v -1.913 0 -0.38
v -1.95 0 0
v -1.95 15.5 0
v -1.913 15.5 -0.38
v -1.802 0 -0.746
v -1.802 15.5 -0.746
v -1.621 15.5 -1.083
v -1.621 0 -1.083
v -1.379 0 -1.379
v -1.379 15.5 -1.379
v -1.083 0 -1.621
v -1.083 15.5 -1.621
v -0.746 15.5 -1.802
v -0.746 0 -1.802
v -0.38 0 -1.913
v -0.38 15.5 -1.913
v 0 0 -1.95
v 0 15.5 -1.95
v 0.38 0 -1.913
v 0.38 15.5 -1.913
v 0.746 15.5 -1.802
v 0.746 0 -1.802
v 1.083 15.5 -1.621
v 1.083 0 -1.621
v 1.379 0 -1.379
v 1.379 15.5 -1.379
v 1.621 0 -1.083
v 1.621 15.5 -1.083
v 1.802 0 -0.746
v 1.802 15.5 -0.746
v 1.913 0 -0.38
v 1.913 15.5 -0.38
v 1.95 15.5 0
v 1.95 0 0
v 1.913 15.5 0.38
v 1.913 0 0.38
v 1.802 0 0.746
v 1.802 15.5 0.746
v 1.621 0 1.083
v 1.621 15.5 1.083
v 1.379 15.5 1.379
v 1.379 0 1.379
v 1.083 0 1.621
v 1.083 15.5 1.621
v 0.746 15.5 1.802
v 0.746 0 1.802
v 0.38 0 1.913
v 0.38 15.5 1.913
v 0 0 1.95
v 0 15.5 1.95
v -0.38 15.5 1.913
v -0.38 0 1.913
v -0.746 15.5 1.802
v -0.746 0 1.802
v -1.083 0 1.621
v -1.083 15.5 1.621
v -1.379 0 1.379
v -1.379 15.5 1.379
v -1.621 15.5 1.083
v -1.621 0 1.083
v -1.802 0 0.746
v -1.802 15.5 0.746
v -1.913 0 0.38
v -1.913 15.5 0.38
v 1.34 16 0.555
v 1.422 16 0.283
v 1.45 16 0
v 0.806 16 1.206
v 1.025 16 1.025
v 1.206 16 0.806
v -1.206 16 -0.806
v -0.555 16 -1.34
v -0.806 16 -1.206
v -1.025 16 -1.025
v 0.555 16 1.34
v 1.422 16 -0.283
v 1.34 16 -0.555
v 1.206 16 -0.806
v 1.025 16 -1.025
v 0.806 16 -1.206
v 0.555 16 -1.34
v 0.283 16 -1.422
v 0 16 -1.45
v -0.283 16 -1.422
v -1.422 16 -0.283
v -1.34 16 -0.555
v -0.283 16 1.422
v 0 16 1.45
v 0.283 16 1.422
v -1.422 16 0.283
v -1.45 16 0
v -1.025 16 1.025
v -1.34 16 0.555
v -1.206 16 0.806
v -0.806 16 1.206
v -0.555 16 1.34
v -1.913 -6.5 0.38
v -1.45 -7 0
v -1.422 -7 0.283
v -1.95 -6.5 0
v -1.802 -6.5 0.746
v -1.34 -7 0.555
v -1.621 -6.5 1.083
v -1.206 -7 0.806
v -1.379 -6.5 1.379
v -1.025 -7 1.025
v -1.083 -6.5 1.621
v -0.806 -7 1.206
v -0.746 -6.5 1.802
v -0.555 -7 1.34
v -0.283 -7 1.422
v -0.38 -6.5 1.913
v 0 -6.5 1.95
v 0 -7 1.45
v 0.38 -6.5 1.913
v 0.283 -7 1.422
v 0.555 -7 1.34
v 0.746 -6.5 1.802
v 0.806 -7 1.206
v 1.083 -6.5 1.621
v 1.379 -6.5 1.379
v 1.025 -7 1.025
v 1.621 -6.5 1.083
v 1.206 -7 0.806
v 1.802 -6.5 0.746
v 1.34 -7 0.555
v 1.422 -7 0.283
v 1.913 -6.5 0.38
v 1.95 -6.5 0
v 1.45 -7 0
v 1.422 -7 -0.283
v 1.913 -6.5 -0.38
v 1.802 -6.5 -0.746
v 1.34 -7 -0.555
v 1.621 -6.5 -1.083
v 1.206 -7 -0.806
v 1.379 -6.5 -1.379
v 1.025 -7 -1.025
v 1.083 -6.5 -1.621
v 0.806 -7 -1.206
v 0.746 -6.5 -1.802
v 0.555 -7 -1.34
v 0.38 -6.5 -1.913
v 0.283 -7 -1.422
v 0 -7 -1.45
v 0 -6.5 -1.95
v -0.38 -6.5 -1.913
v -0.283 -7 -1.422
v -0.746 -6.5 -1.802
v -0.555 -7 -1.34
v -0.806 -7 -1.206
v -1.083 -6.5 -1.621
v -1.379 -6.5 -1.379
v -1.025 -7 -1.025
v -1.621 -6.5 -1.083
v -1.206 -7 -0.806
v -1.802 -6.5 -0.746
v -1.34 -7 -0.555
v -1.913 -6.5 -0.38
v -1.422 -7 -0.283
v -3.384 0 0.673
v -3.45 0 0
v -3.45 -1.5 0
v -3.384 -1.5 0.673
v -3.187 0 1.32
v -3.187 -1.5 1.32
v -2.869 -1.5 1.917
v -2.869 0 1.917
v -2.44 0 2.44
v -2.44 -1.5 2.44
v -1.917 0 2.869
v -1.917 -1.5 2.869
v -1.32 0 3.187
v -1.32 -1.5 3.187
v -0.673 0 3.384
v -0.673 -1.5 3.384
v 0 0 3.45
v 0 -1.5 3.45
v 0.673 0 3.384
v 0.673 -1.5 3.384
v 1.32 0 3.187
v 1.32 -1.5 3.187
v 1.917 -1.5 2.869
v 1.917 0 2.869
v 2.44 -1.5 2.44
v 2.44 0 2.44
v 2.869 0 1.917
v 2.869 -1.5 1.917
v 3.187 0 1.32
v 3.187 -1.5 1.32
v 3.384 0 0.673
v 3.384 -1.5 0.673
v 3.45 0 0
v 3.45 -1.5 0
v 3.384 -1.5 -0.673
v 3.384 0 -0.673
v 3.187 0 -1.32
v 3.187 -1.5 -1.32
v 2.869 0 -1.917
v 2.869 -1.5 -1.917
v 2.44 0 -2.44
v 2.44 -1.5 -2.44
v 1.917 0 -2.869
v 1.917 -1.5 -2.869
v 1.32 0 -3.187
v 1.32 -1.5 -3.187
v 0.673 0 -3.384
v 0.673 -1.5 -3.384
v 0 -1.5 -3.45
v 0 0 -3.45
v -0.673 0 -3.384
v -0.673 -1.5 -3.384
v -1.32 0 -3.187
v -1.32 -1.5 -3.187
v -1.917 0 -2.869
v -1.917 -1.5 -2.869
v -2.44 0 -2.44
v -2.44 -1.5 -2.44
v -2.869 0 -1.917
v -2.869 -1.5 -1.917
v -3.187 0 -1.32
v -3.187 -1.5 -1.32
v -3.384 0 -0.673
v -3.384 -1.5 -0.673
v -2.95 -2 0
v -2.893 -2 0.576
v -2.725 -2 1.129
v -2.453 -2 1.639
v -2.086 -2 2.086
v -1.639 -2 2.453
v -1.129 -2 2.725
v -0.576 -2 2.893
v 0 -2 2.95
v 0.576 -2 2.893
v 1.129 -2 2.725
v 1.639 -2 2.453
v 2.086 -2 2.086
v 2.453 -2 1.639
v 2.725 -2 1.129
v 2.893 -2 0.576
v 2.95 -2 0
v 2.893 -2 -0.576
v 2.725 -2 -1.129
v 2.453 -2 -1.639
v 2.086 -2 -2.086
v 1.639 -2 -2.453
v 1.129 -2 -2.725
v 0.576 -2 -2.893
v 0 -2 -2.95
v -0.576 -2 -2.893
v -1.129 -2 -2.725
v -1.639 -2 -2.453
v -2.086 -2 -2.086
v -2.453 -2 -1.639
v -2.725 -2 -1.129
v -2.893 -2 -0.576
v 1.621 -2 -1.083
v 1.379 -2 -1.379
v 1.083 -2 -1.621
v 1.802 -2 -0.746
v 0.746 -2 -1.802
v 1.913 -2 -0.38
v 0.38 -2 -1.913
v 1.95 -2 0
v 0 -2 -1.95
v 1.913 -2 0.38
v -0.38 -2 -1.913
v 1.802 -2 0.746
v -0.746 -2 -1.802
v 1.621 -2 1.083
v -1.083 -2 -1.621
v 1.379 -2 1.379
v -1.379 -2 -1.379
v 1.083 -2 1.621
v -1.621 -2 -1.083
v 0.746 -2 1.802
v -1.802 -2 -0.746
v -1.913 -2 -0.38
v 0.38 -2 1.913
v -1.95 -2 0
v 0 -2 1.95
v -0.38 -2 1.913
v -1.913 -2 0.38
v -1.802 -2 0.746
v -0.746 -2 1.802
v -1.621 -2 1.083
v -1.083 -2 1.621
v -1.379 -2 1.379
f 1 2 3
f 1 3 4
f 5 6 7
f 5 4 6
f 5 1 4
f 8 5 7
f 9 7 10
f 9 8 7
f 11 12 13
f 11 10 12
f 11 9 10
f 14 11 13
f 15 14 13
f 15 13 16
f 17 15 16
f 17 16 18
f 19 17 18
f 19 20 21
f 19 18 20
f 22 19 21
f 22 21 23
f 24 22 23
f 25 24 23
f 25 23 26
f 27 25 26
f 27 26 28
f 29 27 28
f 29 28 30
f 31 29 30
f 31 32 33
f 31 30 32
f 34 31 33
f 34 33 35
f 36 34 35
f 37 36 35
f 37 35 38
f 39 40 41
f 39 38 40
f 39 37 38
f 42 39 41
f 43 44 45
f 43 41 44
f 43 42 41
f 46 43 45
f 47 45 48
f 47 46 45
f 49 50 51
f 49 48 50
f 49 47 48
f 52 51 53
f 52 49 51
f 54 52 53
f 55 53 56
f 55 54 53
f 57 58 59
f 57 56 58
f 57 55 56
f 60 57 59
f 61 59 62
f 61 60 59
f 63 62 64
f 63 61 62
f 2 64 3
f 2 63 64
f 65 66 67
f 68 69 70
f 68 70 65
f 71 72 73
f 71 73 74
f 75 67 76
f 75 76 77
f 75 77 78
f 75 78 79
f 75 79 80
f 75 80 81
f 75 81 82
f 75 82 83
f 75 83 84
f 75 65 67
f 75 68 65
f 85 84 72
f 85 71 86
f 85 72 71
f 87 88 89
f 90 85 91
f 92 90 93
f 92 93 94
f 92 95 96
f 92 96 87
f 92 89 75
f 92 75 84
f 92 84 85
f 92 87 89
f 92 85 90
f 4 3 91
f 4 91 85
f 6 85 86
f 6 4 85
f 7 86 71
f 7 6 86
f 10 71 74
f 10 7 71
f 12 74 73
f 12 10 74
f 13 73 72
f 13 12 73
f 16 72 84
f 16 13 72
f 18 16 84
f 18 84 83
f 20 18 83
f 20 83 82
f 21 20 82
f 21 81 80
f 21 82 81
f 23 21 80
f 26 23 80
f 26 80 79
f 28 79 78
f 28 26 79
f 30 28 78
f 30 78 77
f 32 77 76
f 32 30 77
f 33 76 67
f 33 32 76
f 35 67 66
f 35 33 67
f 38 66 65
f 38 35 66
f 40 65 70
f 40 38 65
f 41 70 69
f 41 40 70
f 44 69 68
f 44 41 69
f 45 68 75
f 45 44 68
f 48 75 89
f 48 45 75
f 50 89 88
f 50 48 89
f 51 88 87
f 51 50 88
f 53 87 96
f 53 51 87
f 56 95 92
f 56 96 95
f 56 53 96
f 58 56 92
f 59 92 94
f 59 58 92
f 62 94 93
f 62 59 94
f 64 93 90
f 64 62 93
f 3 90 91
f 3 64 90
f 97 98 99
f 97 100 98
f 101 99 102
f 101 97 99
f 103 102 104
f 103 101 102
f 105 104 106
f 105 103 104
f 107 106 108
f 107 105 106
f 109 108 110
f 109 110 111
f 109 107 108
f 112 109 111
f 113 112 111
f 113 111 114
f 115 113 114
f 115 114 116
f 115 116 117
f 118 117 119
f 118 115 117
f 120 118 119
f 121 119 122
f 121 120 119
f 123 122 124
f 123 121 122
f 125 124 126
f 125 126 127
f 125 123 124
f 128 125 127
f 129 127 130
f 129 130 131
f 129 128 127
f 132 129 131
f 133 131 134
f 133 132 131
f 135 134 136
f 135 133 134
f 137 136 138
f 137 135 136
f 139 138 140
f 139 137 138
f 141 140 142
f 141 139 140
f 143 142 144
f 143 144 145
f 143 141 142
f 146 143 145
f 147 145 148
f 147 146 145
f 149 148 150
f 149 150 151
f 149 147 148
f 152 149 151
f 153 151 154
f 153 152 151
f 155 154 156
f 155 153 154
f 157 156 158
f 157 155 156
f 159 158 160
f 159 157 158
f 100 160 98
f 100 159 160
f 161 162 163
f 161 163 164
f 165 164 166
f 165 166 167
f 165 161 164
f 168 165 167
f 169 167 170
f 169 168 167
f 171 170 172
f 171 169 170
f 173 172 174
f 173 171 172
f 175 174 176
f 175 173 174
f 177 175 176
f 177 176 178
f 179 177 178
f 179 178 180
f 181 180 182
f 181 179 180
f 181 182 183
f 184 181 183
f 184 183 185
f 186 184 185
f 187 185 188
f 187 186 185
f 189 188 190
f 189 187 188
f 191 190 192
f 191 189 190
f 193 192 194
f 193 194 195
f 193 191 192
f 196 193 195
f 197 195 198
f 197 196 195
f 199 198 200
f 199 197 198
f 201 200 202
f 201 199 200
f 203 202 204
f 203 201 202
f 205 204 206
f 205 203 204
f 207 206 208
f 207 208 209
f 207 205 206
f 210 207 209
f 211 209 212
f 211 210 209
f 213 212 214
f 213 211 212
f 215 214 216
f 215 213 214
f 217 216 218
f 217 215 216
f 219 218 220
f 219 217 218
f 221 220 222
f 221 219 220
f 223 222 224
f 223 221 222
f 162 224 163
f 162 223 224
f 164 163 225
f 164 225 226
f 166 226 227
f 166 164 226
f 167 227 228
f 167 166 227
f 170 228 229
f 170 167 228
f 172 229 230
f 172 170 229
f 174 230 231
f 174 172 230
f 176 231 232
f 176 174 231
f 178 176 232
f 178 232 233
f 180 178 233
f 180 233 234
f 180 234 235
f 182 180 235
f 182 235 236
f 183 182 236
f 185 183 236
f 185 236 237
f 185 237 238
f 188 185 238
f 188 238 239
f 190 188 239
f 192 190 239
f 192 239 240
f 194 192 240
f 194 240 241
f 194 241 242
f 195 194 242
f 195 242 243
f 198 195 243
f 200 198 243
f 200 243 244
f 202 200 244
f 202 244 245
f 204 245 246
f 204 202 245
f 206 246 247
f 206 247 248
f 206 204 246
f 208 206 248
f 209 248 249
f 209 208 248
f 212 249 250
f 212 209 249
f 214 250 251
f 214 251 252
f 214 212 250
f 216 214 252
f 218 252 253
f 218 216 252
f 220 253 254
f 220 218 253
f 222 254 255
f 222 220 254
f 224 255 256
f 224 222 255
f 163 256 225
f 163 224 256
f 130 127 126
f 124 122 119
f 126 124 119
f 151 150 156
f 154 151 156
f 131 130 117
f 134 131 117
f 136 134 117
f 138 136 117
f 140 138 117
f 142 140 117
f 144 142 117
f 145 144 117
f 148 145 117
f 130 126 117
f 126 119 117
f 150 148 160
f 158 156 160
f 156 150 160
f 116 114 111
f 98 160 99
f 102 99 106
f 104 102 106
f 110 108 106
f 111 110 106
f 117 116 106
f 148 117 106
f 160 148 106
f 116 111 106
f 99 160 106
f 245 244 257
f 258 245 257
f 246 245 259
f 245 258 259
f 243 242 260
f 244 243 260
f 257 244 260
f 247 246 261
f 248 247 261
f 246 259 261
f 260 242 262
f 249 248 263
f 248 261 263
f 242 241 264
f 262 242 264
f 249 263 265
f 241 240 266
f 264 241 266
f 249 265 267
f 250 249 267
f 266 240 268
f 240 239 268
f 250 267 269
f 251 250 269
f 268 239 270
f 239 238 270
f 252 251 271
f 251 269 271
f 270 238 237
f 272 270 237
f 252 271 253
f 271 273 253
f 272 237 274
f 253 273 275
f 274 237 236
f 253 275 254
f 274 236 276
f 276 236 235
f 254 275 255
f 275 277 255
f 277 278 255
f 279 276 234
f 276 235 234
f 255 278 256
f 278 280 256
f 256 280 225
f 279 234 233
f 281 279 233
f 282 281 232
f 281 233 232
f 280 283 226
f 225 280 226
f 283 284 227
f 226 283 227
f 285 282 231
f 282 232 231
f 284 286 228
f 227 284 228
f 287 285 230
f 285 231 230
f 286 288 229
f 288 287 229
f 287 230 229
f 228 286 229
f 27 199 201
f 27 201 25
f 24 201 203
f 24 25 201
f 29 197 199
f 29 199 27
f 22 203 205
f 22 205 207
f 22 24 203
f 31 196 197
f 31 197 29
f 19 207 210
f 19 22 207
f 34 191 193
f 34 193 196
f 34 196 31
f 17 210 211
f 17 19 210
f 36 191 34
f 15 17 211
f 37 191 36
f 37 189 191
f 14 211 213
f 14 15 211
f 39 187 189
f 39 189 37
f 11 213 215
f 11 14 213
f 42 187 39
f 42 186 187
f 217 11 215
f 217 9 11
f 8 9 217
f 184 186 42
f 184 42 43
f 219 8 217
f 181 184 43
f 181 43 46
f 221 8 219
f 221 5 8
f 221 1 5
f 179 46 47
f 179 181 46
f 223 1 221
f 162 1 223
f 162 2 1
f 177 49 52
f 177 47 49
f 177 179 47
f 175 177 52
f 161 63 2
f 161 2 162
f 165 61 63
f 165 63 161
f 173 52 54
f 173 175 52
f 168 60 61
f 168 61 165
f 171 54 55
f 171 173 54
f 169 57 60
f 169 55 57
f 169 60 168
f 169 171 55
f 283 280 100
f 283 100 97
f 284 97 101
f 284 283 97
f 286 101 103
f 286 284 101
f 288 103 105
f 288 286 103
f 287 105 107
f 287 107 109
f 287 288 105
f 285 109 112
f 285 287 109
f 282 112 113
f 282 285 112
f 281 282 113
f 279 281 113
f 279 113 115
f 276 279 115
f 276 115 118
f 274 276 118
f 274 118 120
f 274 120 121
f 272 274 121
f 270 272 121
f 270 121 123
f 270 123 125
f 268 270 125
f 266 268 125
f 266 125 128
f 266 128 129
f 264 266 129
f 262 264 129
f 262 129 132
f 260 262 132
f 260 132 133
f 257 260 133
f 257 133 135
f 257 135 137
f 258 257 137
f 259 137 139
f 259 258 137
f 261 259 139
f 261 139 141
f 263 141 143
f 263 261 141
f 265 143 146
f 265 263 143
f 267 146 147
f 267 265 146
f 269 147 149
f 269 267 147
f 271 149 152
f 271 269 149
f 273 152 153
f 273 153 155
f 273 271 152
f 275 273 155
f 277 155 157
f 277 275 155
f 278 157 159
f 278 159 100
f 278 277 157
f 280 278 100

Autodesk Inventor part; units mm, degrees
ref_plane "YZ Plane" through (0, 0, 0) normal (1, 0, 0) x (0, 1, 0)
ref_plane "XZ Plane" through (0, 0, 0) normal (0, 1, 0) x (-1, 0, 0)
ref_plane "XY Plane" through (0, 0, 0) normal (0, 0, 1) x (1, 0, 0)
sketch "Sketch1" plane through (0, 0, 0) normal (0, 1, 0) x (-1, 0, 0)
  circle A0 centre (0, 0) radius 1.95
  dimension "d0" = 3.9
extrude "Extrusion1" add sketch "Sketch1" along normal blind 16 and the other way blind 7
sketch "Sketch2" plane through (0, 0, 0) normal (0, 1, 0) x (-1, 0, 0)
  circle A0 centre (0, 0) radius 1.95 projected
  circle A1 centre (0, 0) radius 3.45
  dimension "d5" = 1.5
extrude "Extrusion2" add sketch "Sketch2" against normal blind 2
chamfer "Chamfer1" distance 0.5 angle 45 3 edges at (1.95, 16, 0) (1.95, -7, 0) (3.45, -2, 0)
properties part number "button"
